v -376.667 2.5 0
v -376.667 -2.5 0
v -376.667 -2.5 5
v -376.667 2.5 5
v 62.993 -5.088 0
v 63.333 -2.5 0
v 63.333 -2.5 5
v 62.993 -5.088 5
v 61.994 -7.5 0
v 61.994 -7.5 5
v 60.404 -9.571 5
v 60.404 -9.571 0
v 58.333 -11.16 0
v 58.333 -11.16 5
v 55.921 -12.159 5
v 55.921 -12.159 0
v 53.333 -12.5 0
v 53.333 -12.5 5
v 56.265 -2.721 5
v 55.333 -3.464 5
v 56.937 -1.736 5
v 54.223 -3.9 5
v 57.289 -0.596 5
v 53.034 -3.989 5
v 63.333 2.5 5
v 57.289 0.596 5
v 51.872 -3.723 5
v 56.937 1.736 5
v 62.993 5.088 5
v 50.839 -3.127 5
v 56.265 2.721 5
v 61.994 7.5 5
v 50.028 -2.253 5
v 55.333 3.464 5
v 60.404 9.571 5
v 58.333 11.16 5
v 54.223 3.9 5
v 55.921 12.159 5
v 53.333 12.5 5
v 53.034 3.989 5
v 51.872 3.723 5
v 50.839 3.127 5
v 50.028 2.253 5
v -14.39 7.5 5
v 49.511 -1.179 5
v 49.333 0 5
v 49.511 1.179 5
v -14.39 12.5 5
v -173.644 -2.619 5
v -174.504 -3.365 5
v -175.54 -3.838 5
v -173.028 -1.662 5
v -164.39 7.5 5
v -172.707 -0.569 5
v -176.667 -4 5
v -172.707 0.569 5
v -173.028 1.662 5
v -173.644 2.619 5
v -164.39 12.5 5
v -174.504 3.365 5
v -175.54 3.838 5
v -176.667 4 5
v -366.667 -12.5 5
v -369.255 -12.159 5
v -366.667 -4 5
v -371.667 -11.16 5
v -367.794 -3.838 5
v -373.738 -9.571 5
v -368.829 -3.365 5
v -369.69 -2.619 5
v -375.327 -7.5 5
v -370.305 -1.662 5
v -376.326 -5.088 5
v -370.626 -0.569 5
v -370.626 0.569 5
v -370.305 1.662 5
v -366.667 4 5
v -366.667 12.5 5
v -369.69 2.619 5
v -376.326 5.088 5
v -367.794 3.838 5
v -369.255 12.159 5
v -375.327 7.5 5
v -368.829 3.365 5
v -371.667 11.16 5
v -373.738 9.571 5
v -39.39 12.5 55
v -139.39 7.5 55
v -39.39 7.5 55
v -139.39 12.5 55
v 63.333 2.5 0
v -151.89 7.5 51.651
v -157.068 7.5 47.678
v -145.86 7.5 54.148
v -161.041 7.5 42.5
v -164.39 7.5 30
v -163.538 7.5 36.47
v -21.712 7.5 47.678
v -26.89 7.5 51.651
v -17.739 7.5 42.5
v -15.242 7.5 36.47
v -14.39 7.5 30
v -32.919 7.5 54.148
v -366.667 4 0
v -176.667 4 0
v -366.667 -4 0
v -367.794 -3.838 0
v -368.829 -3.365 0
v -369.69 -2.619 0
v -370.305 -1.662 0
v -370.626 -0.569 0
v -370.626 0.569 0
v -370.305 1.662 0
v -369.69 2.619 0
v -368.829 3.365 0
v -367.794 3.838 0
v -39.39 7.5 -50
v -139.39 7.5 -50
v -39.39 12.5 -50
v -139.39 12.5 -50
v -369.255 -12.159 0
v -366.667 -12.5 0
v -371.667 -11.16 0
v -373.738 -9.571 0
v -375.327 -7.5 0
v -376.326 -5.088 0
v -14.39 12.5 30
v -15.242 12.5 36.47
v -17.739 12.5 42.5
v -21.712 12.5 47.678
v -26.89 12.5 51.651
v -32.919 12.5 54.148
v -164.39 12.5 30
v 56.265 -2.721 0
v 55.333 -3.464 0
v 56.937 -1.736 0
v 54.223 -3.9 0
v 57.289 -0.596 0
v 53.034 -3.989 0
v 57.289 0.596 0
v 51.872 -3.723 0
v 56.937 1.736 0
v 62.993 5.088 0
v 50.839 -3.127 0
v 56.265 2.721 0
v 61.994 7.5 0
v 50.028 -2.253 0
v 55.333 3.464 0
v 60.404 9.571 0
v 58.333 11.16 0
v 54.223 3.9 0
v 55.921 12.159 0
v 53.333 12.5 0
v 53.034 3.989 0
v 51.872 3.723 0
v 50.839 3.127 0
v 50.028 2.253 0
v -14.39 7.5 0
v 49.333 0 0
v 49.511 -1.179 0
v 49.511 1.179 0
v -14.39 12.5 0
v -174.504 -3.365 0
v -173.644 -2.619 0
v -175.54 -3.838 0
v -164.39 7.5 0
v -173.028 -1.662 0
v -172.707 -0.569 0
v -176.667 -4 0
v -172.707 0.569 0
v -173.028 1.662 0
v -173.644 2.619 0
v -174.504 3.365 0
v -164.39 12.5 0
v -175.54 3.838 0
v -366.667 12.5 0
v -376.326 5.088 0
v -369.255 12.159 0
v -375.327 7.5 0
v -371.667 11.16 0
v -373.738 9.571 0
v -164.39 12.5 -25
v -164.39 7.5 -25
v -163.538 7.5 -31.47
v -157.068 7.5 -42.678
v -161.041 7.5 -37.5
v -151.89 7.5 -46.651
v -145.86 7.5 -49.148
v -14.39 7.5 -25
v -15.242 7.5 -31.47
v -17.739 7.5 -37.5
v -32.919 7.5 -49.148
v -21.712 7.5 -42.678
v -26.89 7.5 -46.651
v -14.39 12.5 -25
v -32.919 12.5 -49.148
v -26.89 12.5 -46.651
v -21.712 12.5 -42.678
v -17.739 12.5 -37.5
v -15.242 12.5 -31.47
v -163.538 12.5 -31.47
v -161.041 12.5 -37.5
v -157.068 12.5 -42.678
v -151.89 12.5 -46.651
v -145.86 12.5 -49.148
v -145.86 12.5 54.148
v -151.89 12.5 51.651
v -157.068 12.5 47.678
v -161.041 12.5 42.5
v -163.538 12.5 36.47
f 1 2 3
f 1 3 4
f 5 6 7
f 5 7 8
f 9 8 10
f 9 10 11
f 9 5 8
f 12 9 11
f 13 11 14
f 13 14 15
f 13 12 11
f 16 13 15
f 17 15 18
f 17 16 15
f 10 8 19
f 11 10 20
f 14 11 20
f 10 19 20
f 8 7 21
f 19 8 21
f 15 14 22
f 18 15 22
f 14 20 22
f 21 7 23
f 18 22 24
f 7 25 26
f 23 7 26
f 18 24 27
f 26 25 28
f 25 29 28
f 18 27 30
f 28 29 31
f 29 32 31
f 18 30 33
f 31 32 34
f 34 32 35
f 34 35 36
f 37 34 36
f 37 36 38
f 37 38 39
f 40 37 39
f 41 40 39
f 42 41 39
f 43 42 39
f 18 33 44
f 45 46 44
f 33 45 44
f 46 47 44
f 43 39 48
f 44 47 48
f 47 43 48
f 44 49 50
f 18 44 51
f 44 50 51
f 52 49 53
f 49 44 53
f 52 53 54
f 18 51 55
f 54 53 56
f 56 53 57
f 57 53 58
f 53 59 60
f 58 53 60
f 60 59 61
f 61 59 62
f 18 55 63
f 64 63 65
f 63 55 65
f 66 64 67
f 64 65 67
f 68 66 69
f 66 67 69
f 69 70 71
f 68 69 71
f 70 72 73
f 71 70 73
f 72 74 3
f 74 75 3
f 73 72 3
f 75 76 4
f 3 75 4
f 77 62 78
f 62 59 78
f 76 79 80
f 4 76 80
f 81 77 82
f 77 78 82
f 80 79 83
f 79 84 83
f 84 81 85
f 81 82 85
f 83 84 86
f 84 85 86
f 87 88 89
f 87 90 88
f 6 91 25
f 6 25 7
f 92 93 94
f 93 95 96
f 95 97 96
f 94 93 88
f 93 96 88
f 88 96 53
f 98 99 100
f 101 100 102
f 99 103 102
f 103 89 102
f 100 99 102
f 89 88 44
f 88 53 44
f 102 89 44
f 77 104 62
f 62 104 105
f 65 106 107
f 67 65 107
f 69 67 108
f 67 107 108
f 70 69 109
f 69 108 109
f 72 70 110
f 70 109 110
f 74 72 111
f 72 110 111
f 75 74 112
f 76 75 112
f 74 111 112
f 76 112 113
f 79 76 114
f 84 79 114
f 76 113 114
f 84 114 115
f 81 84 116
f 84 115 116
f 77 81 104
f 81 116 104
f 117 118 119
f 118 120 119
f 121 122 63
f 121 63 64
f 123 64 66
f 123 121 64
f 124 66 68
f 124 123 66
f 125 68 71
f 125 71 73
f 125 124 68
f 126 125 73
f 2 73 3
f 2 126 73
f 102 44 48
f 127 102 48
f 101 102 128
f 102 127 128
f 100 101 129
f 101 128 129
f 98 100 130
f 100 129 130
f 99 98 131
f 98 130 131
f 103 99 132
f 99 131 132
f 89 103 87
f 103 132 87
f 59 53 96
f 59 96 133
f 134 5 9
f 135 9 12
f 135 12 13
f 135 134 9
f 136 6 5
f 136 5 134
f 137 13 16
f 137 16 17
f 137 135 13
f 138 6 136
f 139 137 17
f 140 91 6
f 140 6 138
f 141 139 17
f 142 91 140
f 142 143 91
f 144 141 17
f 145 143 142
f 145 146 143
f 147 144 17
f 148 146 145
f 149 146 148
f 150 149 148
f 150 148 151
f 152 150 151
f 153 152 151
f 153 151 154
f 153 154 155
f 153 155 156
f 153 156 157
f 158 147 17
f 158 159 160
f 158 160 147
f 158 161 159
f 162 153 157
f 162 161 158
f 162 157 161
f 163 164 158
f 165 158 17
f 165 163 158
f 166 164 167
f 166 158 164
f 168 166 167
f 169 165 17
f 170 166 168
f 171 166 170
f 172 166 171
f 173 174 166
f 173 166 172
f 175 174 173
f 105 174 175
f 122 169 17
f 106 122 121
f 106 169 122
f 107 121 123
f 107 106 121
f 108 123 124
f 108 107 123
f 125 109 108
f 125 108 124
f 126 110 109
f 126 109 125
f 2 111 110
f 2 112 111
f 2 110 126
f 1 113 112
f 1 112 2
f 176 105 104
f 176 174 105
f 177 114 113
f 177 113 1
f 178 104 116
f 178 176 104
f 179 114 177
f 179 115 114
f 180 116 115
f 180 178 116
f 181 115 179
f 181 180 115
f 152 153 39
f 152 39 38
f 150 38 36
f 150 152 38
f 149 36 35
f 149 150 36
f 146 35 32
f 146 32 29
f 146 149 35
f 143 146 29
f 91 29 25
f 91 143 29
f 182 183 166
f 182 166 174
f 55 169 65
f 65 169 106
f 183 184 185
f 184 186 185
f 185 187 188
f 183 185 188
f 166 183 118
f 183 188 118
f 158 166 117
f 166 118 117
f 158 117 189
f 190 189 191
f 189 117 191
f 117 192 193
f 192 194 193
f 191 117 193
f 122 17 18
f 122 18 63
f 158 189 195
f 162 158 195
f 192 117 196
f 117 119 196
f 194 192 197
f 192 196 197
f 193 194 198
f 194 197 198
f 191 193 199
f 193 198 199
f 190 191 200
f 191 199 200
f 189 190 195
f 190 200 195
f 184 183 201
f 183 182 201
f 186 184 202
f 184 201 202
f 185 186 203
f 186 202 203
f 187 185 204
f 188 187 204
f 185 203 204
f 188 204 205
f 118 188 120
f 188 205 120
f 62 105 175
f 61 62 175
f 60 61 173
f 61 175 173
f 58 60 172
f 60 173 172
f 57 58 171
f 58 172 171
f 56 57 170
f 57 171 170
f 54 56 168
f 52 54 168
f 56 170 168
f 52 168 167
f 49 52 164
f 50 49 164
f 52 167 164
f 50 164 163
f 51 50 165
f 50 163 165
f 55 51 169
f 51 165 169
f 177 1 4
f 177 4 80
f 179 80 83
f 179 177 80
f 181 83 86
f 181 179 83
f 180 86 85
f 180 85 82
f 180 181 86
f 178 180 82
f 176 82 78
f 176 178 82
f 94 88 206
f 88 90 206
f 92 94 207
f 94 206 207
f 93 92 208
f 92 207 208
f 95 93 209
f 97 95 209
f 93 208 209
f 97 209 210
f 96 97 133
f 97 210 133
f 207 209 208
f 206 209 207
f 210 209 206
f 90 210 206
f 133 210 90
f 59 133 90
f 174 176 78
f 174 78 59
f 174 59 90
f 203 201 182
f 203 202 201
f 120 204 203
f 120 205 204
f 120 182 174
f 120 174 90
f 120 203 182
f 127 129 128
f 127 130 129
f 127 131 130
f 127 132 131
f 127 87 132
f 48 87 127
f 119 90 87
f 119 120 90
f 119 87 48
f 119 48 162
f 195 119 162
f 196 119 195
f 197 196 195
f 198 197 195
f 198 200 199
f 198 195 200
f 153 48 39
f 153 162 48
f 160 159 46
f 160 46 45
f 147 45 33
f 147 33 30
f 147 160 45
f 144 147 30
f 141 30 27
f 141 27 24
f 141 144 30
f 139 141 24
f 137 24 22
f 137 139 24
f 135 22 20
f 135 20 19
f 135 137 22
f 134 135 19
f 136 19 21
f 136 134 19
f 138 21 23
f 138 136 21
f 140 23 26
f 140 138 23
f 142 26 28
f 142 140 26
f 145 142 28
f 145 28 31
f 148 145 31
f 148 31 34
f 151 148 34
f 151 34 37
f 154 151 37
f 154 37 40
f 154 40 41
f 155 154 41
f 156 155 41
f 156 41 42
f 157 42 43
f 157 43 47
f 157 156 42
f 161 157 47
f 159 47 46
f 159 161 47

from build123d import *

# Parameters (mm, degrees)
SKETCH1_R                = 4
BOSS_EXTRUDE1_DEPTH      = 5
BOSS_EXTRUDE2_DEPTH      = 50
BOSS_EXTRUDE2_DEPTH_BACK = 55
SKETCH2_W                = 150
SKETCH2_H                = 5
FILLET1_R                = 25


with BuildPart() as part:
    # Sketch1 → Boss-Extrude1 (new body)
    with BuildSketch(Plane.XY):
        with BuildLine():
            Line((-366.666725266, 12.5), (-126.666725266, 12.5))
            Line((-126.666725266, 12.5), (53.333274734, 12.5))
            ThreePointArc((53.333274734, 12.5), (60.404342545, 9.571067812), (63.333274734, 2.5))
            Line((63.333274734, 2.5), (63.333274734, -2.5))
            ThreePointArc((63.333274734, -2.5), (60.404342545, -9.571067812), (53.333274734, -12.5))
            Line((53.333274734, -12.5), (-126.666725266, -12.5))
            Line((-126.666725266, -12.5), (-366.666725266, -12.5))
            ThreePointArc((-366.666725266, -12.5), (-373.737793078, -9.571067812), (-376.666725266, -2.5))
            Line((-376.666725266, -2.5), (-376.666725266, 2.5))
            ThreePointArc((-376.666725266, 2.5), (-373.737793078, 9.571067812), (-366.666725266, 12.5))
        make_face()
        with Locations(Location((53.333274734, 0, 0), (0, 0, 180))):
            Circle(SKETCH1_R, mode=Mode.SUBTRACT)
        with BuildLine():
            Line((-366.666725266, 4), (-176.666725266, 4))
            ThreePointArc((-176.666725266, 4), (-172.666725266, 0), (-176.666725266, -4))
            Line((-176.666725266, -4), (-366.666725266, -4))
            ThreePointArc((-366.666725266, -4), (-370.666725266, 0), (-366.666725266, 4))
        make_face(mode=Mode.SUBTRACT)
    extrude(amount=BOSS_EXTRUDE1_DEPTH)

    # Sketch2 → Boss-Extrude2 (add, two sides: drawn at the far end of the back side and taken through both)
    with BuildSketch(Plane.XY.offset(5).offset(-BOSS_EXTRUDE2_DEPTH_BACK)):
        with Locations((-89.389943781, 10)):
            Rectangle(SKETCH2_W, SKETCH2_H)
    extrude(amount=BOSS_EXTRUDE2_DEPTH + BOSS_EXTRUDE2_DEPTH_BACK)

    # Fillet1
    fillet1_edges = [part.edges().sort_by_distance(p)[0] for p in [
        (-14.389943781, 10, -50),
        (-164.389943781, 10, -50),
        (-164.389943781, 10, 55),
        (-14.389943781, 10, 55),
    ]]
    fillet(fillet1_edges, radius=FILLET1_R)


solid = part.part
